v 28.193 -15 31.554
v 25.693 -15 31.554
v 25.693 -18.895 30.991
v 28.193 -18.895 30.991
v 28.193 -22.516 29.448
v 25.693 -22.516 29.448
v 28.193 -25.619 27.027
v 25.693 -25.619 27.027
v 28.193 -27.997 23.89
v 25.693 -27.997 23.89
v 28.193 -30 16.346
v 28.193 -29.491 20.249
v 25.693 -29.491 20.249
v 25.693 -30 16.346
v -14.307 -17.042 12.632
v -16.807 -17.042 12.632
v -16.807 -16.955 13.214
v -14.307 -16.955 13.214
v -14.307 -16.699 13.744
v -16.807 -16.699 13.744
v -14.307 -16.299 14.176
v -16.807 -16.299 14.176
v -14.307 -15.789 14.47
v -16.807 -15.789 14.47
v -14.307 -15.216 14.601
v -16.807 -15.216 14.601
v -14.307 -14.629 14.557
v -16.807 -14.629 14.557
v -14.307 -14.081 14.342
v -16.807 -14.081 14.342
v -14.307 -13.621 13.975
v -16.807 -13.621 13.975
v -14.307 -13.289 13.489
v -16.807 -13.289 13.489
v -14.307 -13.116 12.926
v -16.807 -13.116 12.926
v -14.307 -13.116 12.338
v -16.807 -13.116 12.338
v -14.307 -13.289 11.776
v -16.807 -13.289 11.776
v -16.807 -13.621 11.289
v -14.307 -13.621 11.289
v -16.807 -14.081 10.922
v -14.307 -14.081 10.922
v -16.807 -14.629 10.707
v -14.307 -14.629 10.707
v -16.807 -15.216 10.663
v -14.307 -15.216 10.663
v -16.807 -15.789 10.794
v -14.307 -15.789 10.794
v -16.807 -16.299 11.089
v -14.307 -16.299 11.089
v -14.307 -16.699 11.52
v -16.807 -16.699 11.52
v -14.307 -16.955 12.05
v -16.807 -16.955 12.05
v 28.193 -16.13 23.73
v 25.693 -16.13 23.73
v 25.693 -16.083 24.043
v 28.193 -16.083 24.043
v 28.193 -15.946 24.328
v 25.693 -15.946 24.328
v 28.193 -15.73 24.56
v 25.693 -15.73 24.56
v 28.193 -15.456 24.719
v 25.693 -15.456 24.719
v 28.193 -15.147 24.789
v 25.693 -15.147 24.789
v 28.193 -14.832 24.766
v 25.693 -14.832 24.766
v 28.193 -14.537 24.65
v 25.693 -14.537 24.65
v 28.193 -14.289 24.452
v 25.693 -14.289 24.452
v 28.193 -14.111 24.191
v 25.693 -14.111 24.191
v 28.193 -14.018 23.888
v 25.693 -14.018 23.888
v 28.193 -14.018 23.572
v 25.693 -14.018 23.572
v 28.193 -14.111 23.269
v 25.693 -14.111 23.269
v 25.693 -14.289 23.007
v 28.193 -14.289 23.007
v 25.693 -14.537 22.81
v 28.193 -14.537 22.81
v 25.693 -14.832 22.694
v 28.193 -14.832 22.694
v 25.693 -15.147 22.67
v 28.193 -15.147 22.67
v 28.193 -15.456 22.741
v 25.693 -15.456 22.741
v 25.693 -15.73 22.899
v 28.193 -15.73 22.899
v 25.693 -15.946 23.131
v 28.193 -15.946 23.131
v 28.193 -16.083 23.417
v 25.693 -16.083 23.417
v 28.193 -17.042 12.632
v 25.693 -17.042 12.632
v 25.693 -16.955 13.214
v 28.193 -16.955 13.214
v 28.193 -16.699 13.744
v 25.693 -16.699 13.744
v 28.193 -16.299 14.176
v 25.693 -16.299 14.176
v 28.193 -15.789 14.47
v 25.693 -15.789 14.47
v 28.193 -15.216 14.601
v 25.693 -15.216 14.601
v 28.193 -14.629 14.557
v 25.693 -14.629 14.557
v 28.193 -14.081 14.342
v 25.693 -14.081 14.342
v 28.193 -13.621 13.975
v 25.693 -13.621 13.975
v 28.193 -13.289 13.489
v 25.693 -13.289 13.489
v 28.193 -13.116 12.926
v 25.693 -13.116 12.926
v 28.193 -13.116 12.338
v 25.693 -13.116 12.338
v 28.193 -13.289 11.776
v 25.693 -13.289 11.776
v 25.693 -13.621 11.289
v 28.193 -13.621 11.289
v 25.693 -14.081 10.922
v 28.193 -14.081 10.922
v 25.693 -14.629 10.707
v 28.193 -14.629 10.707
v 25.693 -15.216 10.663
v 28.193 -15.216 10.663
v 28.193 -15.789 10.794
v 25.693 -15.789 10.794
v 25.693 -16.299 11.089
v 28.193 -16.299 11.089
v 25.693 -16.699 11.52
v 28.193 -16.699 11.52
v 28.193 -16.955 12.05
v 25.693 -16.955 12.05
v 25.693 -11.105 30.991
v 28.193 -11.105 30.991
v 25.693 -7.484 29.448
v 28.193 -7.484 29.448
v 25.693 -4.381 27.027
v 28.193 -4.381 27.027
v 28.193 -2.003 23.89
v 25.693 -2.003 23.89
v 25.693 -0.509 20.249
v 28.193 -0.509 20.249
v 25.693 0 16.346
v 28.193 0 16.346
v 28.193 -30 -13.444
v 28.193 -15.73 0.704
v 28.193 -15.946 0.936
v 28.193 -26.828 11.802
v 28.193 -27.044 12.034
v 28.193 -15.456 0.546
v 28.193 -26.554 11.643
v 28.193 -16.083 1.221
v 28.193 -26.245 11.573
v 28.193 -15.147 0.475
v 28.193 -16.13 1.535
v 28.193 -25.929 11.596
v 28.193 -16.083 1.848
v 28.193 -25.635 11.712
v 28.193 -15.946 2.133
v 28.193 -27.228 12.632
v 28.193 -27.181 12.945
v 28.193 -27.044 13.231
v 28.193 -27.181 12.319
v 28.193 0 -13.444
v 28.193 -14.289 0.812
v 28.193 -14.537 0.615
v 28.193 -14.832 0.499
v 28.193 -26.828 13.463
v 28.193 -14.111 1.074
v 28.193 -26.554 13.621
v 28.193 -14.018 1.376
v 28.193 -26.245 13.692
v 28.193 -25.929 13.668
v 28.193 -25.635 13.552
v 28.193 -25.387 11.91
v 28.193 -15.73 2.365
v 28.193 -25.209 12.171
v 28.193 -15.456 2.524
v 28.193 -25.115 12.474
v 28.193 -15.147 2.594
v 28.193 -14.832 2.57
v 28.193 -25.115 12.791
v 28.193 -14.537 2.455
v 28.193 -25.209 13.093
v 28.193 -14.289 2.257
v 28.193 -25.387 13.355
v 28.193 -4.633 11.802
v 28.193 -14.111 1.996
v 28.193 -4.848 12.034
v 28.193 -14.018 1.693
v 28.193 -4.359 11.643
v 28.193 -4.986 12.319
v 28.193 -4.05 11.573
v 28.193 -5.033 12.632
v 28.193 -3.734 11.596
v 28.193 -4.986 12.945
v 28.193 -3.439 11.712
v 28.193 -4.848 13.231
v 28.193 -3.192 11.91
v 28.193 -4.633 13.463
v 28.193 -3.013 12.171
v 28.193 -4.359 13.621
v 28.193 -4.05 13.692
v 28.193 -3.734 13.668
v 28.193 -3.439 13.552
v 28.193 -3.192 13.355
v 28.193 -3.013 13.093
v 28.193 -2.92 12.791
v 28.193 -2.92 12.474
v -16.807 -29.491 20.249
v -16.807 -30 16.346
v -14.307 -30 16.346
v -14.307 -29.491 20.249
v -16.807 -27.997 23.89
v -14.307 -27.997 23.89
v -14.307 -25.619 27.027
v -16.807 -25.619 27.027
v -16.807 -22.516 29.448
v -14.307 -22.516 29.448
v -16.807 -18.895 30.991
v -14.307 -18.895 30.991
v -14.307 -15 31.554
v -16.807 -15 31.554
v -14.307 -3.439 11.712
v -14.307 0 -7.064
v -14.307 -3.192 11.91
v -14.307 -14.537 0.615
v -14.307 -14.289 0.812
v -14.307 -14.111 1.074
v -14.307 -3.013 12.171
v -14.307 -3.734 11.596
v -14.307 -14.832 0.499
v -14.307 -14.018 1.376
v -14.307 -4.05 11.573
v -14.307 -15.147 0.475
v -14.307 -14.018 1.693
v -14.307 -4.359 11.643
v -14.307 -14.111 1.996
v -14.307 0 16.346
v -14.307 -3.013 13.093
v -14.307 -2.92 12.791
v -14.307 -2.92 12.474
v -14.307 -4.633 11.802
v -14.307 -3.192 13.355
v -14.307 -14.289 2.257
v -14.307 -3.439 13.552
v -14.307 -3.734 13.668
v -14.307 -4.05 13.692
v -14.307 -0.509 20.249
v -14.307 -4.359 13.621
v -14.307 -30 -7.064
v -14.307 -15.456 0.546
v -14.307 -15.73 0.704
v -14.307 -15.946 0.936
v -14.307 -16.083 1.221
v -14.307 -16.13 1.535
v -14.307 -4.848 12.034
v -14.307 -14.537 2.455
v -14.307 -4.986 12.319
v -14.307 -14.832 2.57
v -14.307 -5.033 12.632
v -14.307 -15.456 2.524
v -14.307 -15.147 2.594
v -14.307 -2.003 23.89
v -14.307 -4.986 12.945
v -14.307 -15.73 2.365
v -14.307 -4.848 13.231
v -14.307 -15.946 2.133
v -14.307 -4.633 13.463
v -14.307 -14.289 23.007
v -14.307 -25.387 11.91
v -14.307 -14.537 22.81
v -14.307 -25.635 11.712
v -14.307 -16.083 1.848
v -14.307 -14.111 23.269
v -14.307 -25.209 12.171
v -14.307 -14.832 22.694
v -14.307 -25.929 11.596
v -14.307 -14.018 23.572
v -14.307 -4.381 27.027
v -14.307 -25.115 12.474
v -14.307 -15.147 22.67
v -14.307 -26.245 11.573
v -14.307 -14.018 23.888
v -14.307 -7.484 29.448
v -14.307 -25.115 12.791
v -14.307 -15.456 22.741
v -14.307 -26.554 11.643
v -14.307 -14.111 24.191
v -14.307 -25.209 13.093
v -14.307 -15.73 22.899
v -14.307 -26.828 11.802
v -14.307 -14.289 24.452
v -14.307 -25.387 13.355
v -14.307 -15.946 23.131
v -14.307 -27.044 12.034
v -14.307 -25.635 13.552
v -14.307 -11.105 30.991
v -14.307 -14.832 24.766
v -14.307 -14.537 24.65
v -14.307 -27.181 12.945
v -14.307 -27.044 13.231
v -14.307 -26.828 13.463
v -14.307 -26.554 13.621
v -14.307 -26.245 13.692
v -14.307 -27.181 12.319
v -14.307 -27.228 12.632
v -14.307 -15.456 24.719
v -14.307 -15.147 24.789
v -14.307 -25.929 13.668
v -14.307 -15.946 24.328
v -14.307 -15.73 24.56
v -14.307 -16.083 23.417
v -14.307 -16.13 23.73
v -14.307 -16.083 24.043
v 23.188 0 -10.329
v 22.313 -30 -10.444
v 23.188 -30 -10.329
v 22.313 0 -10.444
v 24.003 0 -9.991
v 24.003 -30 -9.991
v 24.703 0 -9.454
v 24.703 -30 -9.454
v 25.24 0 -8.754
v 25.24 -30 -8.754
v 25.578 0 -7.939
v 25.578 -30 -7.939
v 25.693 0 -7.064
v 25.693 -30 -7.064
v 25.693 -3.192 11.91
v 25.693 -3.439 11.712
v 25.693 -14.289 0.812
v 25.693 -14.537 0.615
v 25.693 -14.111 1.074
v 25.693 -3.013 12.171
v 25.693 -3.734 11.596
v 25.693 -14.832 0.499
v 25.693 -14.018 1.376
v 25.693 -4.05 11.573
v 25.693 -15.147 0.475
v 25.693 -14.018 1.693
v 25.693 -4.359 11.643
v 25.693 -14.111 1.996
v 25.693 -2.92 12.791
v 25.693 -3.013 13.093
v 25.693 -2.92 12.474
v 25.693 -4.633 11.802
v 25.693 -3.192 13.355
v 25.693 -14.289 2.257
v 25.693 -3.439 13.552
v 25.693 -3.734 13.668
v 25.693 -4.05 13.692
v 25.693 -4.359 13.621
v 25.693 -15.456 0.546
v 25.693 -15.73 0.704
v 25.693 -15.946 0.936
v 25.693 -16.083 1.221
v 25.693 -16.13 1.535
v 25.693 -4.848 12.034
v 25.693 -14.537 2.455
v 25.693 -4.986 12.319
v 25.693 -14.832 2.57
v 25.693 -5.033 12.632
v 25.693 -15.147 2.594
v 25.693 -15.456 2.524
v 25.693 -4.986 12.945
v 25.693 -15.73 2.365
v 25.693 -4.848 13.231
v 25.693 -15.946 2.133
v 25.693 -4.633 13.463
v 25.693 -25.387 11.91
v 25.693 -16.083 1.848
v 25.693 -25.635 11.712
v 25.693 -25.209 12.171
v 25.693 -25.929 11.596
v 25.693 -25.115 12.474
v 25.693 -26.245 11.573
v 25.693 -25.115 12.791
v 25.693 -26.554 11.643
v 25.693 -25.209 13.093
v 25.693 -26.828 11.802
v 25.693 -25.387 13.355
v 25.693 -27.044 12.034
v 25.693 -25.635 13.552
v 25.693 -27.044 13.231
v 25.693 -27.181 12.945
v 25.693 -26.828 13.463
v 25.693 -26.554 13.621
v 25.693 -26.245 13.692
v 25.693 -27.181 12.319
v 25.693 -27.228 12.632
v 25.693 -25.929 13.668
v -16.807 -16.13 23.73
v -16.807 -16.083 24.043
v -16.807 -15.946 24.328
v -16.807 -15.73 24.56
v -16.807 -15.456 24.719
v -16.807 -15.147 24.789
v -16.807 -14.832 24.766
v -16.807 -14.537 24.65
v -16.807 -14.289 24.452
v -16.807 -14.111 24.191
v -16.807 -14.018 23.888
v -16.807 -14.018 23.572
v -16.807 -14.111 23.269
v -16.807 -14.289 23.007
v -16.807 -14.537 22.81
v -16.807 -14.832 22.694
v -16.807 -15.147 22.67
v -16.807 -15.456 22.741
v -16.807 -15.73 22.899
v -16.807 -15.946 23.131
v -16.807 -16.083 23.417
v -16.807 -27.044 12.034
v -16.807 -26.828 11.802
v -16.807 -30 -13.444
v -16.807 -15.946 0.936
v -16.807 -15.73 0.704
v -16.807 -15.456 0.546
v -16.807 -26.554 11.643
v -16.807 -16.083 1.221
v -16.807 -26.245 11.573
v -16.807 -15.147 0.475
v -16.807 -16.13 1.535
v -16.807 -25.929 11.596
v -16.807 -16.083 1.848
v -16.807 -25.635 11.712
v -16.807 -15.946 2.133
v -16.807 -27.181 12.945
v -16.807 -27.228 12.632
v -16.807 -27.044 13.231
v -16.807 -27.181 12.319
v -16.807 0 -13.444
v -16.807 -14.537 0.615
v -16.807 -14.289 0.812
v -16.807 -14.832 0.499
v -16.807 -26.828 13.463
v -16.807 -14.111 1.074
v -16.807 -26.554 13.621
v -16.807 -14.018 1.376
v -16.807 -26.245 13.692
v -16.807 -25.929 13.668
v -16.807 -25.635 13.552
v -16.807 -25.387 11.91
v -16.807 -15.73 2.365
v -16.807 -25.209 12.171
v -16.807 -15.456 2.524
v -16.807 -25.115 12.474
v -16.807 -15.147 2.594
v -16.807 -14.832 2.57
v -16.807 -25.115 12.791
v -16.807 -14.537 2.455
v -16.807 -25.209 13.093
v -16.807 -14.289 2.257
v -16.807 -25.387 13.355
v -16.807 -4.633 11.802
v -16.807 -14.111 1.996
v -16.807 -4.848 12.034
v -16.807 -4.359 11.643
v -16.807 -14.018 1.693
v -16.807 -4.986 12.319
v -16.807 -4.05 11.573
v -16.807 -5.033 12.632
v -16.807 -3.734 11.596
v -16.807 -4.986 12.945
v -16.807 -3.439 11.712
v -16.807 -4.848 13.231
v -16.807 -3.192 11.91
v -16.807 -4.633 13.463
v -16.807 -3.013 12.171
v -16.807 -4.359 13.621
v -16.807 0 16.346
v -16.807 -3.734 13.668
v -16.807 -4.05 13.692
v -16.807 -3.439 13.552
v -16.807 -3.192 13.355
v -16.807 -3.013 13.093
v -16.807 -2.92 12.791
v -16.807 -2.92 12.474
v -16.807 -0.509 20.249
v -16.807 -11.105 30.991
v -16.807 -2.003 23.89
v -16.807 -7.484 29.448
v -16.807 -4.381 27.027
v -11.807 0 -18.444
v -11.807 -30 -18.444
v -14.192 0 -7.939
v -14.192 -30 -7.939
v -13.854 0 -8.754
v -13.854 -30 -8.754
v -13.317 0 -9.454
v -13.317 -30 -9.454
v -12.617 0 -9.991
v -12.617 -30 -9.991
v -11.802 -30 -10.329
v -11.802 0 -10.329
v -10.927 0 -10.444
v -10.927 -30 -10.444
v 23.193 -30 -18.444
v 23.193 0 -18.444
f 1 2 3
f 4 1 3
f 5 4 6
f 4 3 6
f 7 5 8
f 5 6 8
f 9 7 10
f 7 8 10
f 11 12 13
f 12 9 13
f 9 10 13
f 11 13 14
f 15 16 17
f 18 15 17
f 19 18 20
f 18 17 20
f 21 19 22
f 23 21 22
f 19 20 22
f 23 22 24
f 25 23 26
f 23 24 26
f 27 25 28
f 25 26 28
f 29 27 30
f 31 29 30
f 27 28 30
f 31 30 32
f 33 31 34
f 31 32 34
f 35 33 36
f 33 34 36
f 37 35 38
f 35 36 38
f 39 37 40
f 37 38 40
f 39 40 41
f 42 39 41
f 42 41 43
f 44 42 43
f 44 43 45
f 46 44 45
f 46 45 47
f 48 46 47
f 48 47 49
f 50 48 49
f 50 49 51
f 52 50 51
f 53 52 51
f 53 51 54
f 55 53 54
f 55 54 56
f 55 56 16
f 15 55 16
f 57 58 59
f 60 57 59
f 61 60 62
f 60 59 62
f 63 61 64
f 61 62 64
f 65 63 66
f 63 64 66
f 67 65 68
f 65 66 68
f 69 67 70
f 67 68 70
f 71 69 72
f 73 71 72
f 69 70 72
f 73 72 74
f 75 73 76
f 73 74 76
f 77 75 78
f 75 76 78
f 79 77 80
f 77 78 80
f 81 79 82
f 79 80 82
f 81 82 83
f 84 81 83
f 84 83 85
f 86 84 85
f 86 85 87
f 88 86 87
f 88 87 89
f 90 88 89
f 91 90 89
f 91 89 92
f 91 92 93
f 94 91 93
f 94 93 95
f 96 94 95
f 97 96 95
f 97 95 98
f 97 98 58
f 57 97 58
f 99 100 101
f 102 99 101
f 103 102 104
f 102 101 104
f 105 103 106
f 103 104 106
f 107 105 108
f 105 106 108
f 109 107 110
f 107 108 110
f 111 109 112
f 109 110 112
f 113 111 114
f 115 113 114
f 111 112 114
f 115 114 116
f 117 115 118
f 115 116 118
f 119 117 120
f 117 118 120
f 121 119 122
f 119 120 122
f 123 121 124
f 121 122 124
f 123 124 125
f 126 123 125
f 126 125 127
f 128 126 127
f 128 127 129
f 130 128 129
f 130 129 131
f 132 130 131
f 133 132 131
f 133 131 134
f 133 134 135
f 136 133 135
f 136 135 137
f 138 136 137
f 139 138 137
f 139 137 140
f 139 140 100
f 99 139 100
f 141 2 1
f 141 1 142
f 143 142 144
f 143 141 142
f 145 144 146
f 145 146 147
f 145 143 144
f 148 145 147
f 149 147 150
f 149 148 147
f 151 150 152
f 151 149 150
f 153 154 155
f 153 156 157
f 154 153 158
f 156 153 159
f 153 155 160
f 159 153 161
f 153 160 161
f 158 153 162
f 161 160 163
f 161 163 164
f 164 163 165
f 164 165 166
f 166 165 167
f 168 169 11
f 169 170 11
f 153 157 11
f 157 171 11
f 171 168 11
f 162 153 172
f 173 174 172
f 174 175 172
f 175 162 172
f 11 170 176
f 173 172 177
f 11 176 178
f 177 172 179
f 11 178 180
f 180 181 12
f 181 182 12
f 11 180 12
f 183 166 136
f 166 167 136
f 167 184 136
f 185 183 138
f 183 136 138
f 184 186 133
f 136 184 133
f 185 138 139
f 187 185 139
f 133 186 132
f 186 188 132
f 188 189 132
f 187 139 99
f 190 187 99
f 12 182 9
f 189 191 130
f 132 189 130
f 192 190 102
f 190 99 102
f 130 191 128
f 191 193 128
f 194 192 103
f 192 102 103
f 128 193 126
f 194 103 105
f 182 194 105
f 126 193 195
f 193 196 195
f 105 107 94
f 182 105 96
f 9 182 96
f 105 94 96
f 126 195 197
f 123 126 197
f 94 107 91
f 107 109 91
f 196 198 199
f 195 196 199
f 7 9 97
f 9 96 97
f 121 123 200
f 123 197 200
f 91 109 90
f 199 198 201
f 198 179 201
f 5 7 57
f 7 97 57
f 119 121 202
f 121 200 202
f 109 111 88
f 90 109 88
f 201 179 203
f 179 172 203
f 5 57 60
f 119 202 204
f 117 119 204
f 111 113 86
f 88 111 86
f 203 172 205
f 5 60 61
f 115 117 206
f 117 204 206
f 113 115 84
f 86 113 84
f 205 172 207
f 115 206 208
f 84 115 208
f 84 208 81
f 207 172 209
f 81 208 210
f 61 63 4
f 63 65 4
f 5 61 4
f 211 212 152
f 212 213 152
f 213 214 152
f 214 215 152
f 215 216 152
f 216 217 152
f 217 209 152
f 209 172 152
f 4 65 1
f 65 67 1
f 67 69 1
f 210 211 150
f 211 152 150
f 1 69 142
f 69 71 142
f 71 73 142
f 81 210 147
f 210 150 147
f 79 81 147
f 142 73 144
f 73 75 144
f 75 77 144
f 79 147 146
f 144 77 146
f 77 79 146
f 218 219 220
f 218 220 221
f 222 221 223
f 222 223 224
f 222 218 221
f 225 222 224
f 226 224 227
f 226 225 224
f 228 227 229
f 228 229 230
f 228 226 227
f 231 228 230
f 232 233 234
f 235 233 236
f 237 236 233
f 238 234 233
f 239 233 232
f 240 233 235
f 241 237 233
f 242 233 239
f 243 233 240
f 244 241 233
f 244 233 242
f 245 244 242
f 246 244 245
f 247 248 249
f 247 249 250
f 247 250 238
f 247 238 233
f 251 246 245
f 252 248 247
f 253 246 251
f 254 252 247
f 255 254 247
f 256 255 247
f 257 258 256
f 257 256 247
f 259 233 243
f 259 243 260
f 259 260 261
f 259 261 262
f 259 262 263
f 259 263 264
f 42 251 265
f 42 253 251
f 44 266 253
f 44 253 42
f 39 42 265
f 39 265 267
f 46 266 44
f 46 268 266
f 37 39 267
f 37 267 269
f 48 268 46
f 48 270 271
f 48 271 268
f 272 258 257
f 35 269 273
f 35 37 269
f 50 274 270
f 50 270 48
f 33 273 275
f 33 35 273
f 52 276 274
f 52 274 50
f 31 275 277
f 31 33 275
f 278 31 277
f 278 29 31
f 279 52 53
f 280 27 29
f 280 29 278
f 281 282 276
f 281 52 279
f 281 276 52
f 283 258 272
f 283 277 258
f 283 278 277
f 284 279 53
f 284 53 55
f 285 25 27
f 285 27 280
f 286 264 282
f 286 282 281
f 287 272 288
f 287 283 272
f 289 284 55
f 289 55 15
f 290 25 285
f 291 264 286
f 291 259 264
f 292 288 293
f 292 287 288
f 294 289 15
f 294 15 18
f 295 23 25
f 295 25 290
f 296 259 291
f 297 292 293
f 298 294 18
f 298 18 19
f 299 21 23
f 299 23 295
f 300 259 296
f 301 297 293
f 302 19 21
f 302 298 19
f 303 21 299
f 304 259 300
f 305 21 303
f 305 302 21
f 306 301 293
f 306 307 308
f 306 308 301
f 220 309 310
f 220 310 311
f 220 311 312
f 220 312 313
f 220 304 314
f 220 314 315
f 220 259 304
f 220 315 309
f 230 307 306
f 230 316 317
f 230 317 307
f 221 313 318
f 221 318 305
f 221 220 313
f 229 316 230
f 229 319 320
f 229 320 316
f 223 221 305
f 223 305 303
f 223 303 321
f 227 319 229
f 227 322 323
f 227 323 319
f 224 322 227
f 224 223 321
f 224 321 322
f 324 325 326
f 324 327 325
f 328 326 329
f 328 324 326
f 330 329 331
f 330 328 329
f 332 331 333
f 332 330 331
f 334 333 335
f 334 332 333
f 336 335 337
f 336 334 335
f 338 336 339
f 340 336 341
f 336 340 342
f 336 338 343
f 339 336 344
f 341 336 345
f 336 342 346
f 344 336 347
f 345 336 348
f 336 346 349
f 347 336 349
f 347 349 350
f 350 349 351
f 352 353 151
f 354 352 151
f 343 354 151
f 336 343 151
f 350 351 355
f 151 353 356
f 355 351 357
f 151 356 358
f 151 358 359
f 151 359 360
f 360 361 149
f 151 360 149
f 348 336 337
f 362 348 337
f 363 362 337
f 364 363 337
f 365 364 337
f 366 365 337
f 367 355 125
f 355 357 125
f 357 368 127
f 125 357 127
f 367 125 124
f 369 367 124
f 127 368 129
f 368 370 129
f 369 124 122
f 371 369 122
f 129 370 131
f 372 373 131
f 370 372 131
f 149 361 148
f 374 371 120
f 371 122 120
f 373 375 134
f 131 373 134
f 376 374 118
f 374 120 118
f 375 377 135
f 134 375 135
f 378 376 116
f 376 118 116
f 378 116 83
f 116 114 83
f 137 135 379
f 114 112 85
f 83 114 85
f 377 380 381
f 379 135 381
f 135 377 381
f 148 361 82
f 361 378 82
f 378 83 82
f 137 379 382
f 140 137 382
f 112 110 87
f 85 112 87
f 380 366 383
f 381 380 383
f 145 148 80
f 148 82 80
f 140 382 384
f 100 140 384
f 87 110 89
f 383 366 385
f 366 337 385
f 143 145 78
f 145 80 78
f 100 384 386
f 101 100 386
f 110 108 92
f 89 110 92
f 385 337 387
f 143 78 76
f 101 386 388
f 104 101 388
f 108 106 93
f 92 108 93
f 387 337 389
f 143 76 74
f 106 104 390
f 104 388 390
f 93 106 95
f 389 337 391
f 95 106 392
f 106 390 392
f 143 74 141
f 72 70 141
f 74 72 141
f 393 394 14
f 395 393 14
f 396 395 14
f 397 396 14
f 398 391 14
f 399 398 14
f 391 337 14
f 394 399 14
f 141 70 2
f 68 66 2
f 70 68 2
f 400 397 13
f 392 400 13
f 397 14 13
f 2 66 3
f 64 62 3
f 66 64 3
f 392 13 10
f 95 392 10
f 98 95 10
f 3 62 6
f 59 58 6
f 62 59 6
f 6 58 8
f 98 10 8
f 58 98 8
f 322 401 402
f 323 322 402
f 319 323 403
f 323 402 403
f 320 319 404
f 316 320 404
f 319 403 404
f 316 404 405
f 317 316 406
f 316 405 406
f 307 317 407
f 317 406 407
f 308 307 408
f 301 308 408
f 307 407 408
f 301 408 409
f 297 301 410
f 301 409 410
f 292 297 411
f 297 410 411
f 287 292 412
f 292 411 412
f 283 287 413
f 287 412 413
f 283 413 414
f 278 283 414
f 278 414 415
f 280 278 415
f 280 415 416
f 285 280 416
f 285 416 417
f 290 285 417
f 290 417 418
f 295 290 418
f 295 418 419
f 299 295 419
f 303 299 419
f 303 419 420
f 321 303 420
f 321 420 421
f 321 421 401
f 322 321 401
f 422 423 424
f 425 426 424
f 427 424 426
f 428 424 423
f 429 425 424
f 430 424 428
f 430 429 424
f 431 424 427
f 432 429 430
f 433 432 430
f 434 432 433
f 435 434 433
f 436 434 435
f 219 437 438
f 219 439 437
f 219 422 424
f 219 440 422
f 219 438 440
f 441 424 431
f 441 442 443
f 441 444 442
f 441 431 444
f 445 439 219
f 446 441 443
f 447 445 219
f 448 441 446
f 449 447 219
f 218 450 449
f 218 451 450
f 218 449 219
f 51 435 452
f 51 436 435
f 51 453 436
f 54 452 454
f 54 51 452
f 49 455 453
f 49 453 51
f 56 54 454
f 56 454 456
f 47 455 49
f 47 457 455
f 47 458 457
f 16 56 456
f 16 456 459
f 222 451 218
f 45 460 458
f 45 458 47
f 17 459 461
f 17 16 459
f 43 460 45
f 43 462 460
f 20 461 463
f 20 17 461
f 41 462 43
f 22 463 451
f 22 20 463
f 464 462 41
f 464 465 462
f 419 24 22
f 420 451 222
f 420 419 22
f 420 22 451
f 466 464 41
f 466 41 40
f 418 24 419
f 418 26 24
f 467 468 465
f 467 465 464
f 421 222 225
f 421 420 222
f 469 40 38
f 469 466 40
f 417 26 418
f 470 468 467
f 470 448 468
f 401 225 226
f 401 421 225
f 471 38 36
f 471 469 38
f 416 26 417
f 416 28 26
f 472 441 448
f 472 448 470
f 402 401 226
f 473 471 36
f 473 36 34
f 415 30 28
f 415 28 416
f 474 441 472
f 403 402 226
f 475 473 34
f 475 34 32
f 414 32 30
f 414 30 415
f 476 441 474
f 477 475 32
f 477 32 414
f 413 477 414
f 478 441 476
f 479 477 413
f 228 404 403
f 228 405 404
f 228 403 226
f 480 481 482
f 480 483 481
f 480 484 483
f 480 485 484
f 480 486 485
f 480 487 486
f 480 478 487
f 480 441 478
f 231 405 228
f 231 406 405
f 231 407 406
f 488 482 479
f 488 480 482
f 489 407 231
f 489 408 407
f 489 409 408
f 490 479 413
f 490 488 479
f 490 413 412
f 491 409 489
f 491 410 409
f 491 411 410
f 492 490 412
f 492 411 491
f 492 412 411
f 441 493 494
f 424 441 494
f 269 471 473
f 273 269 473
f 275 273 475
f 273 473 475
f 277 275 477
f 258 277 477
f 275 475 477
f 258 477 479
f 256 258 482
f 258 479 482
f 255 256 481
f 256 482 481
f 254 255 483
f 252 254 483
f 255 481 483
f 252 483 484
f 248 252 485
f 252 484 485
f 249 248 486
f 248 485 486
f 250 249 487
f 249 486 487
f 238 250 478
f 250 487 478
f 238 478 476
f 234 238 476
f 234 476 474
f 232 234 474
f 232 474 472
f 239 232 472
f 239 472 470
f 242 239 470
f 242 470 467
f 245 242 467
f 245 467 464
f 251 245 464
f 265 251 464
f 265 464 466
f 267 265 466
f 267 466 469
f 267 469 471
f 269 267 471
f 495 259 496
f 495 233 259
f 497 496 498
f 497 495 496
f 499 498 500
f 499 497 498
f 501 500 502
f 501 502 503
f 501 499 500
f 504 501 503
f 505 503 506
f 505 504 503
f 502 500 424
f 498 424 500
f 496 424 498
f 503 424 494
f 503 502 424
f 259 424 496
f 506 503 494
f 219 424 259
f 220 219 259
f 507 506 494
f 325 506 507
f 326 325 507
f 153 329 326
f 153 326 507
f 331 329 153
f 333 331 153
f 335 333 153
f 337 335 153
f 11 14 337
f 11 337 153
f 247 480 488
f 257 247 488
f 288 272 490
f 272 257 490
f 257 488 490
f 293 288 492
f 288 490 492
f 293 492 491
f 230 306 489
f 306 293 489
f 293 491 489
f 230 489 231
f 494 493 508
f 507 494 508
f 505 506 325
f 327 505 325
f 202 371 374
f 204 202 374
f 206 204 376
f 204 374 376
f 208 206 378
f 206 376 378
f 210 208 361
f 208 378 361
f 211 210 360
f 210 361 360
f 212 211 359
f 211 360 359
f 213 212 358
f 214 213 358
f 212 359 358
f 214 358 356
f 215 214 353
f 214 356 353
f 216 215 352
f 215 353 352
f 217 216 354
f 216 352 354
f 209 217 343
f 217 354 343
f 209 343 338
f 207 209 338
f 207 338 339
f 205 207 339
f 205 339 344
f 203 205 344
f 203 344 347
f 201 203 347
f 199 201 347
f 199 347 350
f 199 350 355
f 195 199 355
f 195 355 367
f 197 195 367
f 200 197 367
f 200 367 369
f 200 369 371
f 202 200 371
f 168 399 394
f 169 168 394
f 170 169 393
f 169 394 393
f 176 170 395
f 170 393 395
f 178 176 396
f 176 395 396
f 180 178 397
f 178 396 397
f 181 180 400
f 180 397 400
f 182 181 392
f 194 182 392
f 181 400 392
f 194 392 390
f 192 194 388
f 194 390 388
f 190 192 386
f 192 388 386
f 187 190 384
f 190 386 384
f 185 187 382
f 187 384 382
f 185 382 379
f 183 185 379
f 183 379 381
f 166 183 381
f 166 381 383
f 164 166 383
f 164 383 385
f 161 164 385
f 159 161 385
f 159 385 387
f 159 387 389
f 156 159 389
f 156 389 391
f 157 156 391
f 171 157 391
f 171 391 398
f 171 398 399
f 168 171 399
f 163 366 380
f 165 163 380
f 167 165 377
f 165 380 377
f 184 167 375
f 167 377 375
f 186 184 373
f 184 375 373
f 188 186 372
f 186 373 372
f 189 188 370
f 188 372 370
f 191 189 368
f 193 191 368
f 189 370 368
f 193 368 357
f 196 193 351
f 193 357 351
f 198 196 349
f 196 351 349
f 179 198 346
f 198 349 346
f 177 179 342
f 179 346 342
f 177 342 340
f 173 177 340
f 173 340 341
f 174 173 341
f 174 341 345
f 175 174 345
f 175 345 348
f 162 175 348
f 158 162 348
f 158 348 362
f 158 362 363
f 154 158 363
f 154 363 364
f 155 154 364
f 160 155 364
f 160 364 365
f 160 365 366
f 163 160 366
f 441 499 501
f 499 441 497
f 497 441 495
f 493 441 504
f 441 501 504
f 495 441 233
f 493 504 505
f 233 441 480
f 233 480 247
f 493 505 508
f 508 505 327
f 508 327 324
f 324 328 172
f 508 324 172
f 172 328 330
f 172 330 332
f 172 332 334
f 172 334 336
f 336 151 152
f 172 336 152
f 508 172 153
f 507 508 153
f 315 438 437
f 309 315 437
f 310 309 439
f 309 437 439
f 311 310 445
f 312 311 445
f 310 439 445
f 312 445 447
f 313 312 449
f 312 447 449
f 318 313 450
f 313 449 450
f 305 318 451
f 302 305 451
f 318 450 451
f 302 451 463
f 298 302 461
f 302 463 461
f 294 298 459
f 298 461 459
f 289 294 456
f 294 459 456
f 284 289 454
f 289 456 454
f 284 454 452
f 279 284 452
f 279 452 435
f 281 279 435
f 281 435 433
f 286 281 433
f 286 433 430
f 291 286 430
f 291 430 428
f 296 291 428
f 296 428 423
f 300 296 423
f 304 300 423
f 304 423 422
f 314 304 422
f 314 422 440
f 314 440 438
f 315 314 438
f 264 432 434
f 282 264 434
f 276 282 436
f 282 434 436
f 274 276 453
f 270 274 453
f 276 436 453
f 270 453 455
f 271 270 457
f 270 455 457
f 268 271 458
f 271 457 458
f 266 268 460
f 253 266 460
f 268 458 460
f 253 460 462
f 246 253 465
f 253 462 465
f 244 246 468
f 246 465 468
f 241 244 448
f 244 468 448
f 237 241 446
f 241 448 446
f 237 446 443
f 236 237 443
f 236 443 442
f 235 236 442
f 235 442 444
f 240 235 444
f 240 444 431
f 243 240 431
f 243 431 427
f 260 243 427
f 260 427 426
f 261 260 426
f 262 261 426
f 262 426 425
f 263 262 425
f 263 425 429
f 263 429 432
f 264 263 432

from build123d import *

# Parameters (mm, degrees)
F0_W        = 45
F0_H        = 50
F1_DEPTH    = 30
F2_W        = 40
F2_H        = 42
F3_DEPTH    = 30.001
F4_T1_DEPTH = 78.5477272148
F4_T3_DEPTH = 78.5477272148
F5_R        = 3.3798989873
F6_SIZE     = 5
F7_R        = 1.0624158
F7_R_2      = 1.974265
F8_DEPTH    = 45.001


# Not quite as in the source:
# - a fillet or chamfer that OpenCascade refuses, or shapes differently, is made with other operations: its cross-section is extruded or revolved along the edge and cut away or added


with BuildPart() as f1:
    # F0 (on Front) → F1 (new body)
    with BuildSketch(Plane.XZ):
        with Locations((5.6927716359, 6.5557161967)):
            Rectangle(F0_W, F0_H)
    extrude(amount=F1_DEPTH)

    # F2 (on face) → F3 (cut, through all)
    with BuildSketch(Plane.XZ.offset(30)):
        with Locations((5.6927716359, 10.5557161967)):
            Rectangle(F2_W, F2_H)
    extrude(amount=-F3_DEPTH, mode=Mode.SUBTRACT)

    # F4: fillet of radius 15.209545443 on 4 edges, made by hand

    # F4_s2 → F4_t1 (cut)
    with BuildSketch(Plane.YZ.offset(-54.8310919714)):
        with BuildLine():
            ThreePointArc((0, 16.3461707538), (-4.4547727215, 27.1009434752), (-15.209545443, 31.5557161967))
            Line((-15.209545443, 31.5557161967), (0, 31.5557161967))
            Line((0, 31.5557161967), (0, 16.3461707538))
        make_face()
        with BuildLine():
            ThreePointArc((-30, 16.3461707538), (-25.5452272785, 27.1009434752), (-14.790454557, 31.5557161967))
            Line((-14.790454557, 31.5557161967), (-30, 31.5557161967))
            Line((-30, 31.5557161967), (-30, 16.3461707538))
        make_face()
    extrude(amount=F4_T1_DEPTH, mode=Mode.SUBTRACT)

    # F4_s4 → F4_t3 (cut)
    with BuildSketch(Plane.YZ.offset(-12.3310919714)):
        with BuildLine():
            ThreePointArc((-14.790454557, 31.5557161967), (-25.5452272785, 27.1009434752), (-30, 16.3461707538))
            Line((-30, 16.3461707538), (-30, 31.5557161967))
            Line((-30, 31.5557161967), (-14.790454557, 31.5557161967))
        make_face()
        with BuildLine():
            ThreePointArc((-15.209545443, 31.5557161967), (-4.4547727215, 27.1009434752), (0, 16.3461707538))
            Line((0, 16.3461707538), (0, 31.5557161967))
            Line((0, 31.5557161967), (-15.209545443, 31.5557161967))
        make_face()
    extrude(amount=F4_T3_DEPTH, mode=Mode.SUBTRACT)

    # F5
    f5_edges = [f1.edges().sort_by_distance(p)[0] for p in [
        (-14.307228, -15, -10.444284),
        (25.692772, -15, -10.444284),
    ]]
    fillet(f5_edges, radius=F5_R)

    # F6
    f6_edges = [f1.edges().sort_by_distance(p)[0] for p in [
        (-16.807228, -15, -18.444284),
        (28.192772, -15, -18.444284),
    ]]
    chamfer(f6_edges, length=F6_SIZE)

    # F7 (on face) → F8 (cut, through all)
    with BuildSketch(Plane(origin=(-16.8072283641, 0, 0), x_dir=(0, -1, 0), z_dir=(-1, 0, 0))):
        with Locations((3.9704506522, 12.6322340244)):
            Circle(F7_R)
        with Locations((15.0680806522, 23.7298640244)):
            Circle(F7_R)
        with Locations((26.1657106522, 12.6322340244)):
            Circle(F7_R)
        with Locations((15.0680806522, 1.5346040244)):
            Circle(F7_R)
        with Locations((15.0680806522, 12.6322340244)):
            Circle(F7_R_2)
    extrude(amount=-F8_DEPTH, mode=Mode.SUBTRACT)


solid = f1.part
